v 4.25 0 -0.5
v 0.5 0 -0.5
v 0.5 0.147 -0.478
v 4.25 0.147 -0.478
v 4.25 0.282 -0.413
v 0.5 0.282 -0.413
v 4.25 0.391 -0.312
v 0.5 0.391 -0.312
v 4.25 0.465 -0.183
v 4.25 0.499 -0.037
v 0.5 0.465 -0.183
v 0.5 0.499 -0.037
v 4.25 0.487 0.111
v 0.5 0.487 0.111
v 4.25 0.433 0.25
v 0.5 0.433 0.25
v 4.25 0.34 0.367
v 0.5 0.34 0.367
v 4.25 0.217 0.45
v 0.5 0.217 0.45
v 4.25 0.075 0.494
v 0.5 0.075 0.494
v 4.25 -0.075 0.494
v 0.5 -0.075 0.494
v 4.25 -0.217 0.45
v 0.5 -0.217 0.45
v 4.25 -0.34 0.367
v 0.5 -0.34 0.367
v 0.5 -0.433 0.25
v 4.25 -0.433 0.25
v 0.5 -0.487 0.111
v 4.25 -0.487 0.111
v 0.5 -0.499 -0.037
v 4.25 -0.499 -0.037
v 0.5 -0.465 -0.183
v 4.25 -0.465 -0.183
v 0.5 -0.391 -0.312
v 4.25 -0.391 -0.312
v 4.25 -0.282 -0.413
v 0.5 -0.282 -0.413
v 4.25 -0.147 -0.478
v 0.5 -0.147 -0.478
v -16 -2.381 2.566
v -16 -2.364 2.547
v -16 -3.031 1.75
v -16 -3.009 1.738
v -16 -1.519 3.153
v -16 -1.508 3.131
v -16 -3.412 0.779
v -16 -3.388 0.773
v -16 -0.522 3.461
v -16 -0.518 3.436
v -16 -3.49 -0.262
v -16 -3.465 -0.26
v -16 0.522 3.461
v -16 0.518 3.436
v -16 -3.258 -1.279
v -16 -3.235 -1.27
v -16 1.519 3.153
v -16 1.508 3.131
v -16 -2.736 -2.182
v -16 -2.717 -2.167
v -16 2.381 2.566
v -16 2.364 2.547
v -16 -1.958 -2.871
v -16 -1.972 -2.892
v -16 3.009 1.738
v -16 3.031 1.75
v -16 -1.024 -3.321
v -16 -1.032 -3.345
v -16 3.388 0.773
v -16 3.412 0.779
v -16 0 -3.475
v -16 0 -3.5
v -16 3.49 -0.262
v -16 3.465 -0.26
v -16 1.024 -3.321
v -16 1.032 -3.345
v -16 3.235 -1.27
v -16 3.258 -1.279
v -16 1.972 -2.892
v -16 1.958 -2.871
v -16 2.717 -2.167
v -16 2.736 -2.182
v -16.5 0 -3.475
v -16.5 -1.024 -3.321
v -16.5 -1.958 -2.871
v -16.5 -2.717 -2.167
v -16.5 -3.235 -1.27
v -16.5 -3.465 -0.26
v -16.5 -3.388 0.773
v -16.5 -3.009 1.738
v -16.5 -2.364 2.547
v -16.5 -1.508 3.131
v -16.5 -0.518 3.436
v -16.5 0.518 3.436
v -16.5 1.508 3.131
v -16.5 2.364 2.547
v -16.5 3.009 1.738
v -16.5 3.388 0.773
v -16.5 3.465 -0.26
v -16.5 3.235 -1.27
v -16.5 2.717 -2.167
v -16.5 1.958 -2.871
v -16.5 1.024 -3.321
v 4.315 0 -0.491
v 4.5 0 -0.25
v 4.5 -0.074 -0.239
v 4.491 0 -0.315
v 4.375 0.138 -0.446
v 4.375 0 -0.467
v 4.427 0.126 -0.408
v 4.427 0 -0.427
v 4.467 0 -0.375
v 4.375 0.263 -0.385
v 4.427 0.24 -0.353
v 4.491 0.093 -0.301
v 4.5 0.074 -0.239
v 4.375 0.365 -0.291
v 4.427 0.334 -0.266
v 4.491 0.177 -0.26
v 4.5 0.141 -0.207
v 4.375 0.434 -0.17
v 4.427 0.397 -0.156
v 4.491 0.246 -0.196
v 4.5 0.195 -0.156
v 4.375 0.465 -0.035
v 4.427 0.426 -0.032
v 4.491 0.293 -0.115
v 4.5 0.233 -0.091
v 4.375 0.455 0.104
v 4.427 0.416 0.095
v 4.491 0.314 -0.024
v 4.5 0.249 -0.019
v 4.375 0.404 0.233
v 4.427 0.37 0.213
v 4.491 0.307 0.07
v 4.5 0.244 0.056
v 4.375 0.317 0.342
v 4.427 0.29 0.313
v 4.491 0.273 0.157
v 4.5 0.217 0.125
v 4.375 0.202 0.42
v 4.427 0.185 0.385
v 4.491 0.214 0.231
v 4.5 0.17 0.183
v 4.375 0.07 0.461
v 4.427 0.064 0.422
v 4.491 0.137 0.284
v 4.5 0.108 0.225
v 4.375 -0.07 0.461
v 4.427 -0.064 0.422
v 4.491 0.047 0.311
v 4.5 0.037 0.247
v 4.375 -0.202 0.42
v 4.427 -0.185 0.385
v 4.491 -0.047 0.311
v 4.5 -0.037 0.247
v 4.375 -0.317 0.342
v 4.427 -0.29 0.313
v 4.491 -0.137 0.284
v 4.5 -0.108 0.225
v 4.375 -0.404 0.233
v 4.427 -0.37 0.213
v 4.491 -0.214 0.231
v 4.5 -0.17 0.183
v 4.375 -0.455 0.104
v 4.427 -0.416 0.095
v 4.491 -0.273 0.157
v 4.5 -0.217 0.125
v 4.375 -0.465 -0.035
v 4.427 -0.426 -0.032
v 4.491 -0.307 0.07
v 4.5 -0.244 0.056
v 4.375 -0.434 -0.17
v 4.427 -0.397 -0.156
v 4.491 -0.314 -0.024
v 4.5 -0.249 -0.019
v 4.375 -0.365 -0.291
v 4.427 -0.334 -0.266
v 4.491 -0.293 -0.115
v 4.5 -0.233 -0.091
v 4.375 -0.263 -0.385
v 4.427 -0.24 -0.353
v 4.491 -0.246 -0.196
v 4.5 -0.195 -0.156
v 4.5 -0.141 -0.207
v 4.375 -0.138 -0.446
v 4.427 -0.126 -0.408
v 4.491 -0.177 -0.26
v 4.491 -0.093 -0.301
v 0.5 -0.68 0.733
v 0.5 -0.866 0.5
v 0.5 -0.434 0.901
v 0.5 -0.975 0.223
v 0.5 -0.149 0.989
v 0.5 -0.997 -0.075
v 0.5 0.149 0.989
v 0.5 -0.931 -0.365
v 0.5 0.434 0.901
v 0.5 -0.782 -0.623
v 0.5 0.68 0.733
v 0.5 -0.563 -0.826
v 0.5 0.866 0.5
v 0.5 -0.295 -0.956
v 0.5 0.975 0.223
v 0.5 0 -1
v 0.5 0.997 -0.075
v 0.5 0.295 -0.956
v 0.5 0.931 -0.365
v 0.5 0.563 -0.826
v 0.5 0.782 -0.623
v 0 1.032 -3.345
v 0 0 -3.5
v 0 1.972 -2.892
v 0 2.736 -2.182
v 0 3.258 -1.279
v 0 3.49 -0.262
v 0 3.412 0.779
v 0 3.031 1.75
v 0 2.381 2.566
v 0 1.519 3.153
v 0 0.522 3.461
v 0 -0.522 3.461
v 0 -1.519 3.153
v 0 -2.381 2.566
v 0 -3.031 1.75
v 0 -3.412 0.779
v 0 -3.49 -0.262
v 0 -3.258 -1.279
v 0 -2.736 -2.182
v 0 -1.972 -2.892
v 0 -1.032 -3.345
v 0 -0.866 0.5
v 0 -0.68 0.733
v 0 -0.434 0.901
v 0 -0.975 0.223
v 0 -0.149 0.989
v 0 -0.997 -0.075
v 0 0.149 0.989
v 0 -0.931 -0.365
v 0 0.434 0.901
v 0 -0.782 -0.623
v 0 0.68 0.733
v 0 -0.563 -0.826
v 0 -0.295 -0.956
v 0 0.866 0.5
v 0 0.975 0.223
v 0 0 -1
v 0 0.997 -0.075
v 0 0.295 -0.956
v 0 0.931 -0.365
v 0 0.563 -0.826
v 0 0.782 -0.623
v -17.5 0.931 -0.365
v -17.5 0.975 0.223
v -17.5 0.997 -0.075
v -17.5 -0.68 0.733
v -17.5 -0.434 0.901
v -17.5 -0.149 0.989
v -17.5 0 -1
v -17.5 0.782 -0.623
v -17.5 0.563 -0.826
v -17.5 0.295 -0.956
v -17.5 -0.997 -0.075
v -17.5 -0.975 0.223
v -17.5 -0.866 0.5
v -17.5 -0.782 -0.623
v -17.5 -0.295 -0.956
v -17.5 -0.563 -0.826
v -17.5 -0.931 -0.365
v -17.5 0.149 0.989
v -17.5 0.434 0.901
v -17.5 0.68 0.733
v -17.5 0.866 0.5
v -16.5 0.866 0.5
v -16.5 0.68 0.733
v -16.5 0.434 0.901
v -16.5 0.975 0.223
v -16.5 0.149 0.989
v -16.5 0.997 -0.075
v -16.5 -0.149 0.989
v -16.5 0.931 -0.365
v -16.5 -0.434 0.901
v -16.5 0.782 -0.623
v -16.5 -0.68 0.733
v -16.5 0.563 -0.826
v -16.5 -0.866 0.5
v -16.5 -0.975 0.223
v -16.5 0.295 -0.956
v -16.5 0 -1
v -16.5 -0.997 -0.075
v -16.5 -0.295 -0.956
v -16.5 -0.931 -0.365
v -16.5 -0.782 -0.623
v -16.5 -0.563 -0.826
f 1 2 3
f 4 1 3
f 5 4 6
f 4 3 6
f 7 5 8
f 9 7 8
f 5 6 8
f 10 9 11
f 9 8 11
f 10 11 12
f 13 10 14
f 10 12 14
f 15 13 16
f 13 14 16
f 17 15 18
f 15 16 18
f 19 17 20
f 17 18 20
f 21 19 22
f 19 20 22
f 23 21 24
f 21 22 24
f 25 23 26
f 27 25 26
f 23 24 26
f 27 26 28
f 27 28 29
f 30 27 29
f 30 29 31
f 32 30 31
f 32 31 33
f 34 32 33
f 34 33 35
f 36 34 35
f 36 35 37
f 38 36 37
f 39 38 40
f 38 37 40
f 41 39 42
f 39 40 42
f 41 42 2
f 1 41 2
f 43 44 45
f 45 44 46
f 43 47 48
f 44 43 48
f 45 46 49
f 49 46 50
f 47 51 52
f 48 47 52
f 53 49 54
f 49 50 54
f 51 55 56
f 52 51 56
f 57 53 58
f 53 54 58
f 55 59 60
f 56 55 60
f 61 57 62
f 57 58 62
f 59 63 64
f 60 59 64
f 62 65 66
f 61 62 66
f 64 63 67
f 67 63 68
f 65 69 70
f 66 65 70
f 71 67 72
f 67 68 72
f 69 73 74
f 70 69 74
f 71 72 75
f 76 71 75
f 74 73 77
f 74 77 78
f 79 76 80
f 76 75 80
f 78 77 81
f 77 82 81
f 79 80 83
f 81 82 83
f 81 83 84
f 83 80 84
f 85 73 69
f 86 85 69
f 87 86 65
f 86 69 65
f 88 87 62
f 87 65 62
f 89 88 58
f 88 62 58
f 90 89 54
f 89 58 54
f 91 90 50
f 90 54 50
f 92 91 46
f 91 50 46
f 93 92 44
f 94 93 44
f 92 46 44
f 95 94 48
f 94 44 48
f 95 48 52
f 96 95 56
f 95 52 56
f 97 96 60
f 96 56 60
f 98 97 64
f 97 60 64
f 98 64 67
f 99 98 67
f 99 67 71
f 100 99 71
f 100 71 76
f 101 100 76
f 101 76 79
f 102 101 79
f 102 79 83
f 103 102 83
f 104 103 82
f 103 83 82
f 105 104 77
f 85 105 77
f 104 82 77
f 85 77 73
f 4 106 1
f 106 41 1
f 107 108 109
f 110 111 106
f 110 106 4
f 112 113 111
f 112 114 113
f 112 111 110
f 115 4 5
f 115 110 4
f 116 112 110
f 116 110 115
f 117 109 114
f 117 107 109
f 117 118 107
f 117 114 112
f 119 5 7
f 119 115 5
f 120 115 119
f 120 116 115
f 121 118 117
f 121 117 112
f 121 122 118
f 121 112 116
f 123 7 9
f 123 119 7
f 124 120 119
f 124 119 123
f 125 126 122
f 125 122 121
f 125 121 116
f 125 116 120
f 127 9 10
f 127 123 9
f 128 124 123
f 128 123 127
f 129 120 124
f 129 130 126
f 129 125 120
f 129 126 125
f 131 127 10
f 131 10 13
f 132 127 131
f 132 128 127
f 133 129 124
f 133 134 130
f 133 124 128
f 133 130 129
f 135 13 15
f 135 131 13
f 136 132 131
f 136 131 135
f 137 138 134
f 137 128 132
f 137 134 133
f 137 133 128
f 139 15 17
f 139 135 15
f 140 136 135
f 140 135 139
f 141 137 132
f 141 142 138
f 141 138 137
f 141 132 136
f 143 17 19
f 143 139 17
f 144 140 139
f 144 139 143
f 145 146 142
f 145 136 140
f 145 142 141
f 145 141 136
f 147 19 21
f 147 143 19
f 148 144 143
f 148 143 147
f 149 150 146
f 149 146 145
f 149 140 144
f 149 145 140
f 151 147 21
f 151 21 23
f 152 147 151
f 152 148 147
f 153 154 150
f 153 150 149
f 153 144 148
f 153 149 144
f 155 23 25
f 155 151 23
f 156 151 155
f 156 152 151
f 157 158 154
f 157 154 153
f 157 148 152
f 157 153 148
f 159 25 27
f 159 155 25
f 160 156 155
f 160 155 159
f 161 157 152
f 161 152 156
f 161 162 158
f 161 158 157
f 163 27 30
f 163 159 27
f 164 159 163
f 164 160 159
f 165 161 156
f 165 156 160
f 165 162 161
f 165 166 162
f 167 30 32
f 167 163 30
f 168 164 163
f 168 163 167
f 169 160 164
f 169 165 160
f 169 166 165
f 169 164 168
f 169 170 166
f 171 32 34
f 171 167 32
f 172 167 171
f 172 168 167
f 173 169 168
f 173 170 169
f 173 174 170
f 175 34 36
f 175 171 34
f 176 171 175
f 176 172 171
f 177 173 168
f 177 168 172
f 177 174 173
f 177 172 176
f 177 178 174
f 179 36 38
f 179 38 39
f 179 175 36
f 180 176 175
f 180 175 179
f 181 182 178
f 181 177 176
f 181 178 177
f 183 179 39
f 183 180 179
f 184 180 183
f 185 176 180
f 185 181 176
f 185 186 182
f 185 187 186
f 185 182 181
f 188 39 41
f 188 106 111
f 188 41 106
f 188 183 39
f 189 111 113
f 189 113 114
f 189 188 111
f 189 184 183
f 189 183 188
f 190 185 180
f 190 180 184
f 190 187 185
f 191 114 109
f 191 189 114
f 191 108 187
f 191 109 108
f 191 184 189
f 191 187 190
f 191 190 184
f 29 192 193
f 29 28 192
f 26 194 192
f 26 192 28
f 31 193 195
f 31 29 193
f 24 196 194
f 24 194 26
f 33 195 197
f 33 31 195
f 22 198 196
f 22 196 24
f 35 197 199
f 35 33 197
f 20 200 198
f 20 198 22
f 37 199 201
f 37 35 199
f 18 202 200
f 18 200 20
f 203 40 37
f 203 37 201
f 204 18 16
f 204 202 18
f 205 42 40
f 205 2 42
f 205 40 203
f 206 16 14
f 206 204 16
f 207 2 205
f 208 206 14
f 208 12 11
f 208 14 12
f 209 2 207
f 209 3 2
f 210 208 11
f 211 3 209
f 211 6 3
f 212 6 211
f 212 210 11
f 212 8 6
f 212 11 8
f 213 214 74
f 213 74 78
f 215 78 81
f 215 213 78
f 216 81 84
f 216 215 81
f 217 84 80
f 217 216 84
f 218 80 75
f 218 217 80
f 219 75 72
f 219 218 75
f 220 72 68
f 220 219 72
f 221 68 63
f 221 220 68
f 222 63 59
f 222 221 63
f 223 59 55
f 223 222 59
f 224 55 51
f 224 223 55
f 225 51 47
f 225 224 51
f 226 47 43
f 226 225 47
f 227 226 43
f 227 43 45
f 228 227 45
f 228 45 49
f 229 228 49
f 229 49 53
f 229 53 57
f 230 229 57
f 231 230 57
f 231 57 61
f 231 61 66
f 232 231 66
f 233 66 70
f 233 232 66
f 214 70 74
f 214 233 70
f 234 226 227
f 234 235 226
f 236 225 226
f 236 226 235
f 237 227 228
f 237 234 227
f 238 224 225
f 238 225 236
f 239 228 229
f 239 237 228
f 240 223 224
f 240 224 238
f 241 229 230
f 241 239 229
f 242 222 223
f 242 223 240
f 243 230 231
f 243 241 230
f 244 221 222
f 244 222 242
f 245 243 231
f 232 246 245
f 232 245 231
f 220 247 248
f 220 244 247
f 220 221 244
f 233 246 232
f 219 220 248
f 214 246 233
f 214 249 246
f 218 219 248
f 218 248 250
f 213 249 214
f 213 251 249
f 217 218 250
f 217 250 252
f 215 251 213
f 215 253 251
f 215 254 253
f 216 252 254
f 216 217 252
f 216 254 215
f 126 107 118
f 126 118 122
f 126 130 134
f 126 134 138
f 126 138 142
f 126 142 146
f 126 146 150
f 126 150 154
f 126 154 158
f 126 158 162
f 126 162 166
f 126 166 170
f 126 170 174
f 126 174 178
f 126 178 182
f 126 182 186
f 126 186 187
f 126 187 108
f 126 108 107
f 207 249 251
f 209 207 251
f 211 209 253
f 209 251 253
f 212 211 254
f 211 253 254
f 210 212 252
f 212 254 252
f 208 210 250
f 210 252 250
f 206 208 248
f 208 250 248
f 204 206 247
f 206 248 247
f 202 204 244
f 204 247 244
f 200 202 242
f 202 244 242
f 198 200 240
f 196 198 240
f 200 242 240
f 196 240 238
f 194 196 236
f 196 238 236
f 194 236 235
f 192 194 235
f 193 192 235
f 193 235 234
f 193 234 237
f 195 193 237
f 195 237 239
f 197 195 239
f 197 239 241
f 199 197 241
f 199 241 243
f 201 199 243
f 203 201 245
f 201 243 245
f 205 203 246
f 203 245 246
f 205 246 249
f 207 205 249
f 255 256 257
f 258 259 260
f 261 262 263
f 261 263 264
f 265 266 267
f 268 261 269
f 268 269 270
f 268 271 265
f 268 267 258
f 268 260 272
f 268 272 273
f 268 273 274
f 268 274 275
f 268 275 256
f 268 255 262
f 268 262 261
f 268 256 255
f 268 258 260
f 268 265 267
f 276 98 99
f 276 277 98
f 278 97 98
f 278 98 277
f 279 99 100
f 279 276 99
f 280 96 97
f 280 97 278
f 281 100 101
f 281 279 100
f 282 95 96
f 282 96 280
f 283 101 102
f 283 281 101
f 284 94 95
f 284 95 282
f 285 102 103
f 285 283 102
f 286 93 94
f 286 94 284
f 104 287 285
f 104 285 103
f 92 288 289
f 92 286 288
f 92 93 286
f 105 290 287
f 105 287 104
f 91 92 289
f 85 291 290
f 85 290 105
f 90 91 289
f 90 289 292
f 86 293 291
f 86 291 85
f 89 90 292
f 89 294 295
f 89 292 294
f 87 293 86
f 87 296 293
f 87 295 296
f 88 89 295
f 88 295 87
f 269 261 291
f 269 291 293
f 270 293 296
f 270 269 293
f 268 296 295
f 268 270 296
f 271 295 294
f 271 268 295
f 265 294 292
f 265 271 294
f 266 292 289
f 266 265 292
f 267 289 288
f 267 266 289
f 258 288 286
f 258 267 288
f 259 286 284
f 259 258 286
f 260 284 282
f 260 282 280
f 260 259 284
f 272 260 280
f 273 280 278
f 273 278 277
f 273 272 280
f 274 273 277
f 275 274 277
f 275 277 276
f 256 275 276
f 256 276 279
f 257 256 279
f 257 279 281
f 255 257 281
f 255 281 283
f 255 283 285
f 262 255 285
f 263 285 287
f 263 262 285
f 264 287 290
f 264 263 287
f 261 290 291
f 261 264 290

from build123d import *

# Parameters (mm, degrees)
SKETCH1_R           = 3.5
BOSS_EXTRUDE1_DEPTH = 16
SKETCH2_R           = 1
BOSS_EXTRUDE2_DEPTH = 0.5
SKETCH3_R           = 0.5
BOSS_EXTRUDE3_DEPTH = 4
FILLET1_R           = 0.25
SKETCH7_R           = 3.475
BOSS_EXTRUDE6_DEPTH = 0.5
BOSS_EXTRUDE7_START = 1
SKETCH8_R           = 1
BOSS_EXTRUDE7_DEPTH = 1


with BuildPart() as part:
    # Sketch1 → Boss-Extrude1 (new body)
    with BuildSketch(Plane(origin=(0, 0, 0), x_dir=(0, 0, -1), z_dir=(1, 0, 0))):
        Circle(SKETCH1_R)
    extrude(amount=-BOSS_EXTRUDE1_DEPTH)

    # Sketch2 → Boss-Extrude2 (add)
    with BuildSketch(Plane(origin=(0, 0, 0), x_dir=(0, 0, -1), z_dir=(1, 0, 0))):
        Circle(SKETCH2_R)
    extrude(amount=BOSS_EXTRUDE2_DEPTH)

    # Sketch3 → Boss-Extrude3 (add)
    with BuildSketch(Plane(origin=(0.5, 0, 0), x_dir=(0, 0, -1), z_dir=(1, 0, 0))):
        Circle(SKETCH3_R)
    extrude(amount=BOSS_EXTRUDE3_DEPTH)

    # Fillet1
    fillet1_edges = [part.edges().sort_by_distance(p)[0] for p in [
        (4.5, 0, 0.5),
    ]]
    fillet(fillet1_edges, radius=FILLET1_R)

    # Sketch7 → Boss-Extrude6 (add)
    with BuildSketch(Plane.ZY.offset(16)):
        with Locations(Location((0, 0, 0), (0, 0, 180))):
            Circle(SKETCH7_R)
    extrude(amount=BOSS_EXTRUDE6_DEPTH)

    # Sketch8 → Boss-Extrude7 (add)
    with BuildSketch(Plane.ZY.offset(16.5).offset(BOSS_EXTRUDE7_START)):
        with Locations(Location((0, 0, 0), (0, 0, 180))):
            Circle(SKETCH8_R)
    extrude(amount=-BOSS_EXTRUDE7_DEPTH)


solid = part.part
